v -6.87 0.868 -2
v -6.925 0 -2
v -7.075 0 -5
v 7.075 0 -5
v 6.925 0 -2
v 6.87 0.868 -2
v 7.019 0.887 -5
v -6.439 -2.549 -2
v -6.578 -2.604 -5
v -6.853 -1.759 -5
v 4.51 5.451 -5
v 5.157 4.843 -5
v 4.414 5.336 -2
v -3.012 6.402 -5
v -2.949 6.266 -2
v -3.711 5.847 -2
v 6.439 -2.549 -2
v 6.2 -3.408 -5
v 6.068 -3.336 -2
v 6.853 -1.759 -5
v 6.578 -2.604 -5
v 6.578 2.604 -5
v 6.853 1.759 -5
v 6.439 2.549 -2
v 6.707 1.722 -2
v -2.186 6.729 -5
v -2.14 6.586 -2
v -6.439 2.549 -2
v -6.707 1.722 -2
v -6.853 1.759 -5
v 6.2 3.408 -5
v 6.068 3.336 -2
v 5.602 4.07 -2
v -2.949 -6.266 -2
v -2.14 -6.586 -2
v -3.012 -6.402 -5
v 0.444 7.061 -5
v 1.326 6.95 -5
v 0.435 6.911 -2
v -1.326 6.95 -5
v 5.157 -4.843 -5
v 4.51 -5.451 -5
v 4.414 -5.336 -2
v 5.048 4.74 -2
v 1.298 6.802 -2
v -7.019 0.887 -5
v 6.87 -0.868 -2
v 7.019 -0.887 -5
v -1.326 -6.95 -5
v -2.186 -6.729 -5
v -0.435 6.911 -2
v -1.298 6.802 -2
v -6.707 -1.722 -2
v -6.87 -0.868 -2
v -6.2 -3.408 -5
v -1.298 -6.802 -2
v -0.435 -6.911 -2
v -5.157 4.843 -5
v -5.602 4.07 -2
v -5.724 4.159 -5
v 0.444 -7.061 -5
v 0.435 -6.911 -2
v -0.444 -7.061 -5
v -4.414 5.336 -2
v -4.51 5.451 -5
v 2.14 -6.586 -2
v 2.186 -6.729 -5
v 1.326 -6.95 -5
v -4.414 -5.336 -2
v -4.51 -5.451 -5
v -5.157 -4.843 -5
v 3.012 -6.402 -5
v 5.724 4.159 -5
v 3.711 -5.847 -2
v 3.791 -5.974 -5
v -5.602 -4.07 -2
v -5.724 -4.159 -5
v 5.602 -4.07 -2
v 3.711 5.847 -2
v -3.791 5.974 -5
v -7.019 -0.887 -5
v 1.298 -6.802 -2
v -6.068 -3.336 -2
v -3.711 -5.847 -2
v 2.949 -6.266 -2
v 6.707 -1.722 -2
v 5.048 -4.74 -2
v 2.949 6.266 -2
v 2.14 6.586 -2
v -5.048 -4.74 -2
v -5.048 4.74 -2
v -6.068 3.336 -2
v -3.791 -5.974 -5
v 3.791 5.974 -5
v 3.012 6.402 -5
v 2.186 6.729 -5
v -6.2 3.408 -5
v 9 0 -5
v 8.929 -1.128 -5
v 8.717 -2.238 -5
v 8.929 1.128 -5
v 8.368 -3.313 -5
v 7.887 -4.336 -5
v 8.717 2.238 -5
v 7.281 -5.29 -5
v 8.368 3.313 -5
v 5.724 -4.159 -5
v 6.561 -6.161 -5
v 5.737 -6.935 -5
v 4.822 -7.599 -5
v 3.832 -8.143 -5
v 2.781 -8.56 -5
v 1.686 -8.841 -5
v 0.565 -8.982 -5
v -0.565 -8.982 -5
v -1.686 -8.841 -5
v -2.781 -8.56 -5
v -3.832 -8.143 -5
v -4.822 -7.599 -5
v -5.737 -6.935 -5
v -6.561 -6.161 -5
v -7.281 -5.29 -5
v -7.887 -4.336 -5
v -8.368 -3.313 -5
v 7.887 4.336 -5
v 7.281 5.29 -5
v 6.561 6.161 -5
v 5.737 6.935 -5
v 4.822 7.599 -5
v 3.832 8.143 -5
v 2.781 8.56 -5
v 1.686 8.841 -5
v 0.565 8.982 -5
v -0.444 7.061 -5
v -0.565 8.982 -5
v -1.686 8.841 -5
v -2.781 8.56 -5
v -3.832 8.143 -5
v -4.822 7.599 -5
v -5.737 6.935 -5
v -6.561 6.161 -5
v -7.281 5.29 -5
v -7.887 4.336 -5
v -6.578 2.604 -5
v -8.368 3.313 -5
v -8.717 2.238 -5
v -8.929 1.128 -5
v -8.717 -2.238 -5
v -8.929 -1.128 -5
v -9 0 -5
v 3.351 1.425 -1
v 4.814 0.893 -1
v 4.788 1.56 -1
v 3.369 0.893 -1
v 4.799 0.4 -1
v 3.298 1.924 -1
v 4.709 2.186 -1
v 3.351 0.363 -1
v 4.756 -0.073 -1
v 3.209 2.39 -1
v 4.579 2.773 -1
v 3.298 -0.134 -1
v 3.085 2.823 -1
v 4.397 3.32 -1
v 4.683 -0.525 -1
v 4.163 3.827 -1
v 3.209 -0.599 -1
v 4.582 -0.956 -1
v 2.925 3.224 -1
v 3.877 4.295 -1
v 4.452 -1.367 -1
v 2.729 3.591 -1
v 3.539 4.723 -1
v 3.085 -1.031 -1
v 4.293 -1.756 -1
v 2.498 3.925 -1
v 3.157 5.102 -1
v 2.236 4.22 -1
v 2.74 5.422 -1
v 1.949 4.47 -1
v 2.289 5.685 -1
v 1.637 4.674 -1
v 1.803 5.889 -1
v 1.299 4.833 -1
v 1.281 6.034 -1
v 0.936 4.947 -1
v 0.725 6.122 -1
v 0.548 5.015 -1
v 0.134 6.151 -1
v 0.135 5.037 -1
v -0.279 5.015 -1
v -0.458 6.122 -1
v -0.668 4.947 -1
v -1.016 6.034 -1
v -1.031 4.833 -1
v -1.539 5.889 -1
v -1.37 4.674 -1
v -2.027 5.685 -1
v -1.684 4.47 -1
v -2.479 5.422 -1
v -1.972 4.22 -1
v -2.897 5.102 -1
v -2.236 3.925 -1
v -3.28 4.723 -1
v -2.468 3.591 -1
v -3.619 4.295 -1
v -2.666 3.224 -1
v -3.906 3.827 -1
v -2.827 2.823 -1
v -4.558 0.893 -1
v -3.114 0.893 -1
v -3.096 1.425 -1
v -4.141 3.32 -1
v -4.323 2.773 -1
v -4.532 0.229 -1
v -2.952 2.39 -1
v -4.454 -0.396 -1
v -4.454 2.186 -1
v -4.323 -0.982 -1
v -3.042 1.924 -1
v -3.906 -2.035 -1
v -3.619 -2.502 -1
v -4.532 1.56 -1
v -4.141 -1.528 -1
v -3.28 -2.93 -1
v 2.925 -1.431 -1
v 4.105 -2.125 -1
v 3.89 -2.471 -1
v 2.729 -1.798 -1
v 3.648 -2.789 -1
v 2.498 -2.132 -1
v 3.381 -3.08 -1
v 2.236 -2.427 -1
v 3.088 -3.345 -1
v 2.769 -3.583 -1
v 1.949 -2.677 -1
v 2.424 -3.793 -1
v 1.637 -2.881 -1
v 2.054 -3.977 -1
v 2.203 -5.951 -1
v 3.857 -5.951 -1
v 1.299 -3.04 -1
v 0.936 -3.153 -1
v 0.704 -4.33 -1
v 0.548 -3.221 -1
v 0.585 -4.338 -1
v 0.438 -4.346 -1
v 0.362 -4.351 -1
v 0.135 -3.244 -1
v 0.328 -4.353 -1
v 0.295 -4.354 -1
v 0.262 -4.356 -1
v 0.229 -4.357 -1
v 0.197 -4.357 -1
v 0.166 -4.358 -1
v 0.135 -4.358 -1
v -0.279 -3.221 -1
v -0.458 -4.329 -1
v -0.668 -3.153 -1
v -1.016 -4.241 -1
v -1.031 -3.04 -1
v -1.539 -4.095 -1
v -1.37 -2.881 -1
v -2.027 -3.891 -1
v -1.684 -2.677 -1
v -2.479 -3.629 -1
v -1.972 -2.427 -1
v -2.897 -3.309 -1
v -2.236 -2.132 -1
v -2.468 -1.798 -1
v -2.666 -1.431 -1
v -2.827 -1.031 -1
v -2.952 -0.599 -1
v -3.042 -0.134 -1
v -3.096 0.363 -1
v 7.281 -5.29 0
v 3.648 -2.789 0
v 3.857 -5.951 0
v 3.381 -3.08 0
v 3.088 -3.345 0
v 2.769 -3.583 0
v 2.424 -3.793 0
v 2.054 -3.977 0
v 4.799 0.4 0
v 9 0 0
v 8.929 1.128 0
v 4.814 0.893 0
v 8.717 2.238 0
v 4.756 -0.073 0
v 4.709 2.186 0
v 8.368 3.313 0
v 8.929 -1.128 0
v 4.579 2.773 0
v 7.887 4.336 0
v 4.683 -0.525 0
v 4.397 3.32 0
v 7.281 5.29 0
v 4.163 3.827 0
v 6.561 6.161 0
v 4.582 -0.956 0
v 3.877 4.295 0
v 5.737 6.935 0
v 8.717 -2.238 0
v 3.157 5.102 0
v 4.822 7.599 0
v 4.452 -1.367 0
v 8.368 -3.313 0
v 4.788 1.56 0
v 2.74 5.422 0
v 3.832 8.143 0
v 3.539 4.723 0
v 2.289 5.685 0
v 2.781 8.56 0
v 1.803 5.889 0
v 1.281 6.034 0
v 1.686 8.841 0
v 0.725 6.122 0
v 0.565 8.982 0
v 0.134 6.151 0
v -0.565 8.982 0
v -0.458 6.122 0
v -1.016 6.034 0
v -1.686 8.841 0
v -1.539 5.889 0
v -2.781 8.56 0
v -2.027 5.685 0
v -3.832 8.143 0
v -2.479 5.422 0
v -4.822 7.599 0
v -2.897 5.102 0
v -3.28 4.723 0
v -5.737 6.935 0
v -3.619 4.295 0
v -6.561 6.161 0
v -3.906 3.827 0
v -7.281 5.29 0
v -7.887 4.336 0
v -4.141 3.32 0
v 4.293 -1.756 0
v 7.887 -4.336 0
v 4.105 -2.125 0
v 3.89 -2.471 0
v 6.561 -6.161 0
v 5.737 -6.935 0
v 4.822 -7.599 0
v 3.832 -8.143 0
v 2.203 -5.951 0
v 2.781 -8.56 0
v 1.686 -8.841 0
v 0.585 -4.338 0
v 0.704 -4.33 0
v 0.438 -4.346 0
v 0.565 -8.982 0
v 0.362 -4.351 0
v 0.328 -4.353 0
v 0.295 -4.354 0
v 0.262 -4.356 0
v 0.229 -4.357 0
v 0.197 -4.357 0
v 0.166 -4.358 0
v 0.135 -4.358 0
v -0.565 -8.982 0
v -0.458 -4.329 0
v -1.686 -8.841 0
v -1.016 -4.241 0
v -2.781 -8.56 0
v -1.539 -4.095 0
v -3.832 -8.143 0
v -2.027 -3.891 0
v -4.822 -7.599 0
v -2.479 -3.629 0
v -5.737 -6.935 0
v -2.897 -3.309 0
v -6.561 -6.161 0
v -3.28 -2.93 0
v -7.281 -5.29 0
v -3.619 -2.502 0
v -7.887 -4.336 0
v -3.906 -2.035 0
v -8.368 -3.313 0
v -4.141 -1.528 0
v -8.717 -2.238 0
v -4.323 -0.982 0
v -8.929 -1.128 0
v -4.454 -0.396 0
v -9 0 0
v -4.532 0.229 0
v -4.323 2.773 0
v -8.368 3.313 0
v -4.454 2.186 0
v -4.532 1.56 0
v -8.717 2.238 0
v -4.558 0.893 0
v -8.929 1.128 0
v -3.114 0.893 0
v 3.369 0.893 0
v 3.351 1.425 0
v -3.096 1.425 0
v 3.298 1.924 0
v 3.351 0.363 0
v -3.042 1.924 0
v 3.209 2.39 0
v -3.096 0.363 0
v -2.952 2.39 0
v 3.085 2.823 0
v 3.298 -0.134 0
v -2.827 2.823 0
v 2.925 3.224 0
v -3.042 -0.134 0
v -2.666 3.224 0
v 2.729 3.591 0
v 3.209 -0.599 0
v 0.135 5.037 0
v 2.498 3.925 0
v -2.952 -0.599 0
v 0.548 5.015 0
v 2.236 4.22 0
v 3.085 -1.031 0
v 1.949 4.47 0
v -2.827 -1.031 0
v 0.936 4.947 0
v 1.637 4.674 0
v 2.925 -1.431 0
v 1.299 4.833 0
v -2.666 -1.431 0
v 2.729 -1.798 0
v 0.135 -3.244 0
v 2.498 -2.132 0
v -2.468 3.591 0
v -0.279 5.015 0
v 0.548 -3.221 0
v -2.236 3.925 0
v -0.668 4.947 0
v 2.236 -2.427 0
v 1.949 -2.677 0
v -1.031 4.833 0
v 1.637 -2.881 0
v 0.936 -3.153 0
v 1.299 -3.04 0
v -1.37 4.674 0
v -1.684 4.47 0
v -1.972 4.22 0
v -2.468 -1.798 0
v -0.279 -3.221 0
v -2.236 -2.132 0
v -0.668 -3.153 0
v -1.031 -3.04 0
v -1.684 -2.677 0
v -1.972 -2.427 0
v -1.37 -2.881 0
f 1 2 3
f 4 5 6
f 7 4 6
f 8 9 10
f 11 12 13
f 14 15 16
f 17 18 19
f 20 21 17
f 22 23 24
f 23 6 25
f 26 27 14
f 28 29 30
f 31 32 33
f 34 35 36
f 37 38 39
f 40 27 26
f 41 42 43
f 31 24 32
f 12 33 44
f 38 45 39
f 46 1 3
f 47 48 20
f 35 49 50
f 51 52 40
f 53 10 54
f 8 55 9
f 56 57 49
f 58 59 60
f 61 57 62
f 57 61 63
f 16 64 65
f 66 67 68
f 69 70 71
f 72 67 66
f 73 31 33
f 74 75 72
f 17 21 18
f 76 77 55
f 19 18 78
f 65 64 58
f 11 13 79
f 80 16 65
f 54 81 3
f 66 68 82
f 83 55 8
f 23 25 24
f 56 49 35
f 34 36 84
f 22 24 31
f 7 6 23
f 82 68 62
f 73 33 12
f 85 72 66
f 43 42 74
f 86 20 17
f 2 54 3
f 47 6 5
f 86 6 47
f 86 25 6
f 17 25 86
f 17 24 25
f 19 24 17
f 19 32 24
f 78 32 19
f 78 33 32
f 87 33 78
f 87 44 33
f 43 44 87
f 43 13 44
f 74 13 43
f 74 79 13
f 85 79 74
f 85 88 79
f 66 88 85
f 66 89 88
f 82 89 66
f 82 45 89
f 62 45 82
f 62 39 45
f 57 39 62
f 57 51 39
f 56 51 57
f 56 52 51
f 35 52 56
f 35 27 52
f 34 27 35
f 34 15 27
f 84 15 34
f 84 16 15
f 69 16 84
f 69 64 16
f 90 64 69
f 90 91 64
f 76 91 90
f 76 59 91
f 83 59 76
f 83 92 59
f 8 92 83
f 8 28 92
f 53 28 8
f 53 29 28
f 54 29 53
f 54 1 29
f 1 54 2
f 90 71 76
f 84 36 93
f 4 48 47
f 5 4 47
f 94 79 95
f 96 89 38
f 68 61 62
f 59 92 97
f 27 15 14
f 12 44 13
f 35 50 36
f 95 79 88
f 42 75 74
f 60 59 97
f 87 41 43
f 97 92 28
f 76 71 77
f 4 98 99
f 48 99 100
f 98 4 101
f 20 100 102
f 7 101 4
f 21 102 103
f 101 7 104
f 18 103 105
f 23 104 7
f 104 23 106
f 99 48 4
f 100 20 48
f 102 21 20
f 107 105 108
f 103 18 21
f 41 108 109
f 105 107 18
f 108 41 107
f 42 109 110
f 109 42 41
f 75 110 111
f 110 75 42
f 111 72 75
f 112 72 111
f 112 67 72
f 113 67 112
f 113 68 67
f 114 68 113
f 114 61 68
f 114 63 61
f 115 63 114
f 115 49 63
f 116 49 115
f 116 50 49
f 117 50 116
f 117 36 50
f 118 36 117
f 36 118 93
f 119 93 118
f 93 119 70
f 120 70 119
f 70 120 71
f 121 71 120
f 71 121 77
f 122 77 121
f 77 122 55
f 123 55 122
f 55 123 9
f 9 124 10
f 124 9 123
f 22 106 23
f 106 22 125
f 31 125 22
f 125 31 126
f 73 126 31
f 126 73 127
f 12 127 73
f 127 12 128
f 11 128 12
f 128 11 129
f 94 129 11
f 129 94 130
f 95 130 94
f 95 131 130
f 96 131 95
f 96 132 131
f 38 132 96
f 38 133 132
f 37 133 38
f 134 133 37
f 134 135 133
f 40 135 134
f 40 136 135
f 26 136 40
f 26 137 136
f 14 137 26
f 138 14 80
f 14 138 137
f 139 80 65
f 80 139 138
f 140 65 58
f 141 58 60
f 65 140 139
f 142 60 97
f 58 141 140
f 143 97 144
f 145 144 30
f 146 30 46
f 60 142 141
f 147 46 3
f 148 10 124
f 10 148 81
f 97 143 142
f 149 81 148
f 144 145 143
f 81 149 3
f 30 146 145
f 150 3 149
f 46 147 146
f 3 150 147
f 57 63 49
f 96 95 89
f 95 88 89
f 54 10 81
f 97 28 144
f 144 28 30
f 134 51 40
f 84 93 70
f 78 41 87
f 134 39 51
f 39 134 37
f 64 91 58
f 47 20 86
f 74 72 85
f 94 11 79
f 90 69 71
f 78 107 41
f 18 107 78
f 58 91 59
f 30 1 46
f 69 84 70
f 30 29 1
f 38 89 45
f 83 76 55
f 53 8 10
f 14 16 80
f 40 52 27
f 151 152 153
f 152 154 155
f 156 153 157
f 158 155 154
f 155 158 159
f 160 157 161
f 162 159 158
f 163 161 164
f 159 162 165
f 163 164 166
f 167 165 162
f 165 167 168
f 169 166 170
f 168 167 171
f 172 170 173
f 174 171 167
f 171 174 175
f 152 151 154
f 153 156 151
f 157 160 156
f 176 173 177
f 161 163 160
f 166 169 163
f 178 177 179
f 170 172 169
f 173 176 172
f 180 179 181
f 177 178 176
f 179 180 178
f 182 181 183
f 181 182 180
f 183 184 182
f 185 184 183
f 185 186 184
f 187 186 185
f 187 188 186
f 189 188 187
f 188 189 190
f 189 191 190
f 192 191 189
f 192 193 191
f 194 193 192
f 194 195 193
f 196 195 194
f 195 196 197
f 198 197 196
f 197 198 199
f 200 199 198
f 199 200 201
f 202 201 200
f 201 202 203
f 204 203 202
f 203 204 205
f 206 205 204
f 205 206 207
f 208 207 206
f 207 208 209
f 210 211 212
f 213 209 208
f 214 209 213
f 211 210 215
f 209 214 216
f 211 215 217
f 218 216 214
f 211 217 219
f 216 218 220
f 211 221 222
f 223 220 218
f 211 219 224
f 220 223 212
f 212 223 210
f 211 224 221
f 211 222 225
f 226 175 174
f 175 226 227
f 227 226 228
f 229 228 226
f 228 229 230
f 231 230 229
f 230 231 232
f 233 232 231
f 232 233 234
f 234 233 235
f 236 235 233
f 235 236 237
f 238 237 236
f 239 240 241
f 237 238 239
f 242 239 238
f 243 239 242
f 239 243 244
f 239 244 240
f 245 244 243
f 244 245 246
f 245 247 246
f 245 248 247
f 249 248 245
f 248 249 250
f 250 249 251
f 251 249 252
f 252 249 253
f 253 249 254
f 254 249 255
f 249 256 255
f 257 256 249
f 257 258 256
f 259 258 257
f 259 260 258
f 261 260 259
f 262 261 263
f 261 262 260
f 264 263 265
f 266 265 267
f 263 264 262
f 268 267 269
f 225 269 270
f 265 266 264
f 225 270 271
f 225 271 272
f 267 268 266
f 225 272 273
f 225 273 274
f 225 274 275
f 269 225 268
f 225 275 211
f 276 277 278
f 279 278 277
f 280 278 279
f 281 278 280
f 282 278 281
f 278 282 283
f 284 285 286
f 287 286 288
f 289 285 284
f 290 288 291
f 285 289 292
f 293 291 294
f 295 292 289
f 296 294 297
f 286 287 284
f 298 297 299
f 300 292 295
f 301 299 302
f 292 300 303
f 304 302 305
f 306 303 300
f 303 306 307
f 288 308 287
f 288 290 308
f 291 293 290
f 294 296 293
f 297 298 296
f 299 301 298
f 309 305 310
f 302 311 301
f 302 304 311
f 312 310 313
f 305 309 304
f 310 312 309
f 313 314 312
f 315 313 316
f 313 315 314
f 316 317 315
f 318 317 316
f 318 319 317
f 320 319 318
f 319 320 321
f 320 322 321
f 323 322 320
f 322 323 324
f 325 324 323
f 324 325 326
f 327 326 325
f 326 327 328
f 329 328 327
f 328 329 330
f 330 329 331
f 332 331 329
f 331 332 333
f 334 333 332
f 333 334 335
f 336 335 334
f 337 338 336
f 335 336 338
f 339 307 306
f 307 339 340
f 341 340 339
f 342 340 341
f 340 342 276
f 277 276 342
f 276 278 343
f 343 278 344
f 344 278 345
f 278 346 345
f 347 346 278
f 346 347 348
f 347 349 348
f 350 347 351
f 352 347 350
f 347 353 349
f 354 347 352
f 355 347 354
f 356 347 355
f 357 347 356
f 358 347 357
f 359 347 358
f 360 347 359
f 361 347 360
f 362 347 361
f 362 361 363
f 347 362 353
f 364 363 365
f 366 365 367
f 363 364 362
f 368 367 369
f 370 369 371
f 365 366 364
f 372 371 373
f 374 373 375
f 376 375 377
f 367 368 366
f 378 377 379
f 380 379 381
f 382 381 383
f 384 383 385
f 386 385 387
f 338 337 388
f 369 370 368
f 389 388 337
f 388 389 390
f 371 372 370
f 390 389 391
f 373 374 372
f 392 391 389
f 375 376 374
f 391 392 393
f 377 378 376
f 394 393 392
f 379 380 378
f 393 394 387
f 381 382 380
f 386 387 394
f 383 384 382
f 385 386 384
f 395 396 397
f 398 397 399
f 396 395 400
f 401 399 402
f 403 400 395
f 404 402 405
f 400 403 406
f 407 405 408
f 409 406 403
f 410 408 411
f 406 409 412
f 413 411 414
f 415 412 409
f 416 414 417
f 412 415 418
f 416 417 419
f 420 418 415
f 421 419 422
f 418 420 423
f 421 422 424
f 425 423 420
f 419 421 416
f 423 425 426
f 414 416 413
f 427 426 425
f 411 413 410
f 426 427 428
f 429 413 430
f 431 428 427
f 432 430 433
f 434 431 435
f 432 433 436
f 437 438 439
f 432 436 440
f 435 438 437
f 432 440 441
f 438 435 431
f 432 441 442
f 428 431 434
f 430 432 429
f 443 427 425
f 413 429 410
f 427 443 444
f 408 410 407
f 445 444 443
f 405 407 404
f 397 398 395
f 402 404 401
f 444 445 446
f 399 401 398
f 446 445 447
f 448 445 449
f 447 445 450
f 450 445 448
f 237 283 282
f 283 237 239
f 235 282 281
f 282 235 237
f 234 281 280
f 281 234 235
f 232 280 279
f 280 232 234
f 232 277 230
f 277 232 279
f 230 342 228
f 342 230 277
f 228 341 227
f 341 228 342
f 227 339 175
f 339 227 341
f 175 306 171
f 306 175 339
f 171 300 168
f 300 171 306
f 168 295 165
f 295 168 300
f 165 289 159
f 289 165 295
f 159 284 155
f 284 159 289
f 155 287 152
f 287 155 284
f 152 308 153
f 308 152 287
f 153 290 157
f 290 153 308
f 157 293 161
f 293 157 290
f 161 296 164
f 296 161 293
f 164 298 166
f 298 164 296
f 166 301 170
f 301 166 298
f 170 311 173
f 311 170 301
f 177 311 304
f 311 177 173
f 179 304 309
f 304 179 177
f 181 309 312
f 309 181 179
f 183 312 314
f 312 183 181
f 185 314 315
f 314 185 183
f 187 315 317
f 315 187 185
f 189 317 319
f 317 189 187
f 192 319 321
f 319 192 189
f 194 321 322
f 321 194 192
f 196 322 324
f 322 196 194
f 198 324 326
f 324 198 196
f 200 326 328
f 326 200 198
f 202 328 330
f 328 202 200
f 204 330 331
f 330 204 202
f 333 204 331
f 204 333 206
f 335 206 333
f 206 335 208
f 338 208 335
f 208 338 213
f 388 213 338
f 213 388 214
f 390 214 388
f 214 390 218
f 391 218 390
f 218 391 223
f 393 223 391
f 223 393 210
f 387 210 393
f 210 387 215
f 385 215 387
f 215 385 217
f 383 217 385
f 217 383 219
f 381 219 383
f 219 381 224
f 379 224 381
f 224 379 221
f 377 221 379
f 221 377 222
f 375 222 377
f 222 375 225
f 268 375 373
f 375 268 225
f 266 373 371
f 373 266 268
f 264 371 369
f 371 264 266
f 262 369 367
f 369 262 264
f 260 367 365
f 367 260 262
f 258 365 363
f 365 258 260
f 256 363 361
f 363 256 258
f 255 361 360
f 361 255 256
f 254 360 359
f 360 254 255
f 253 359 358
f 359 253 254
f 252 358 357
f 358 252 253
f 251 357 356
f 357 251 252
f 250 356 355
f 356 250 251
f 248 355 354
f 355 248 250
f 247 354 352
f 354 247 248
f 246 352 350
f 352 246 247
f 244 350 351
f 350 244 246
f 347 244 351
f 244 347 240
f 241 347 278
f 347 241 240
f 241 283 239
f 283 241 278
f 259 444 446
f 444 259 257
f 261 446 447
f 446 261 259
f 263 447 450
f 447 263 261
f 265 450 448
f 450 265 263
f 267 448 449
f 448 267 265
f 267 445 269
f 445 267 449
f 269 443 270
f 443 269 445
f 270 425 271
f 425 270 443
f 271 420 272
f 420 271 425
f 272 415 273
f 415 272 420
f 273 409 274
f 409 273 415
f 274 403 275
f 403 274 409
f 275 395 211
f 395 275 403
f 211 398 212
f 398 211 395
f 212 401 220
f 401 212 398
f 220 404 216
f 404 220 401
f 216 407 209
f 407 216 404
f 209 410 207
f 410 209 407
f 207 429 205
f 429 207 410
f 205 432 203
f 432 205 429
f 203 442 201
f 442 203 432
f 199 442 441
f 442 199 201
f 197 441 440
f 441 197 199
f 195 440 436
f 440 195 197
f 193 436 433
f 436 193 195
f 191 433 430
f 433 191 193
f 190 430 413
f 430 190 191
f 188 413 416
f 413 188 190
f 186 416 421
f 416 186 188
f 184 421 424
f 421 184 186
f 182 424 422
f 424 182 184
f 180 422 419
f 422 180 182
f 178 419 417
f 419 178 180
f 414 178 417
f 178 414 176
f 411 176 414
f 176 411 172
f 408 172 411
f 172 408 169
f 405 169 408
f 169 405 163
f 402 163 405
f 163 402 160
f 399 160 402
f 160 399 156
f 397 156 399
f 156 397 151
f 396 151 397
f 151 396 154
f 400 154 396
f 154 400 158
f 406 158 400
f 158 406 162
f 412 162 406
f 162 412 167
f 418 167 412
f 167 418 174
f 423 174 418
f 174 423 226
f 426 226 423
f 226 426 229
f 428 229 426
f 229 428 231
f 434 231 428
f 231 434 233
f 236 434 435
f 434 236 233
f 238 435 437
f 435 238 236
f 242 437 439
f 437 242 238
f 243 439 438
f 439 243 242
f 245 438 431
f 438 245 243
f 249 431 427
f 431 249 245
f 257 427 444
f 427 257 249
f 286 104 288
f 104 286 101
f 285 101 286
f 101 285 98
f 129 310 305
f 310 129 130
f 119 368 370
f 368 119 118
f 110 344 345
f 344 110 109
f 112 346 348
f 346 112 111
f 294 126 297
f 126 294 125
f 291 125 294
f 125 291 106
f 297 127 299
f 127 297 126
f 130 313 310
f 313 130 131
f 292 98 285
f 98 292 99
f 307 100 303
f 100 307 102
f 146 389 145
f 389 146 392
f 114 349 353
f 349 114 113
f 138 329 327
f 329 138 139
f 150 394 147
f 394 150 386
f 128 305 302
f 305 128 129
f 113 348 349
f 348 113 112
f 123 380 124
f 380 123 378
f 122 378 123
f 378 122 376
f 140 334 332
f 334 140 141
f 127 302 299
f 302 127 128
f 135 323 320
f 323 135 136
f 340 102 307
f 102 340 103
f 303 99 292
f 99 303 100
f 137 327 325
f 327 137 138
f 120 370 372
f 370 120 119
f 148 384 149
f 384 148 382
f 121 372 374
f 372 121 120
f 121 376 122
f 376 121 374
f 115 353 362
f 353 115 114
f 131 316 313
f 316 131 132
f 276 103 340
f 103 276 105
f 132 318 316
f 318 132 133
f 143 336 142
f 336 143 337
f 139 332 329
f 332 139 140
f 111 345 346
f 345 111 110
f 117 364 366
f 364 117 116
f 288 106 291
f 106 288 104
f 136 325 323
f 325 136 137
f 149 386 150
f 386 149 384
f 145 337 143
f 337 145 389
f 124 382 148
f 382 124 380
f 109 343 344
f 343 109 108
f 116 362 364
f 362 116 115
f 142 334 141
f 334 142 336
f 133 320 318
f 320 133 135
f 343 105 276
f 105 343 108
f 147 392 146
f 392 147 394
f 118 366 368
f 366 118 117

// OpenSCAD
$fn = 50;

difference() {
	union() {
		translate(v = [0, 0, -5.0]) {
			cylinder(h = 5, r = 9.0);
		}
	}
	union() {
		#translate(v = [0, 0, -5.0]) {
			cylinder(h = 3, r1 = 7.075, r2 = 6.925);
		}
		translate(v = [0, 0, -1]) {
			linear_extrude(height = 1) {
				text(font = "Impact", halign = "center", size = 10, text = "Q", valign = "center");
			}
		}
	}
}
